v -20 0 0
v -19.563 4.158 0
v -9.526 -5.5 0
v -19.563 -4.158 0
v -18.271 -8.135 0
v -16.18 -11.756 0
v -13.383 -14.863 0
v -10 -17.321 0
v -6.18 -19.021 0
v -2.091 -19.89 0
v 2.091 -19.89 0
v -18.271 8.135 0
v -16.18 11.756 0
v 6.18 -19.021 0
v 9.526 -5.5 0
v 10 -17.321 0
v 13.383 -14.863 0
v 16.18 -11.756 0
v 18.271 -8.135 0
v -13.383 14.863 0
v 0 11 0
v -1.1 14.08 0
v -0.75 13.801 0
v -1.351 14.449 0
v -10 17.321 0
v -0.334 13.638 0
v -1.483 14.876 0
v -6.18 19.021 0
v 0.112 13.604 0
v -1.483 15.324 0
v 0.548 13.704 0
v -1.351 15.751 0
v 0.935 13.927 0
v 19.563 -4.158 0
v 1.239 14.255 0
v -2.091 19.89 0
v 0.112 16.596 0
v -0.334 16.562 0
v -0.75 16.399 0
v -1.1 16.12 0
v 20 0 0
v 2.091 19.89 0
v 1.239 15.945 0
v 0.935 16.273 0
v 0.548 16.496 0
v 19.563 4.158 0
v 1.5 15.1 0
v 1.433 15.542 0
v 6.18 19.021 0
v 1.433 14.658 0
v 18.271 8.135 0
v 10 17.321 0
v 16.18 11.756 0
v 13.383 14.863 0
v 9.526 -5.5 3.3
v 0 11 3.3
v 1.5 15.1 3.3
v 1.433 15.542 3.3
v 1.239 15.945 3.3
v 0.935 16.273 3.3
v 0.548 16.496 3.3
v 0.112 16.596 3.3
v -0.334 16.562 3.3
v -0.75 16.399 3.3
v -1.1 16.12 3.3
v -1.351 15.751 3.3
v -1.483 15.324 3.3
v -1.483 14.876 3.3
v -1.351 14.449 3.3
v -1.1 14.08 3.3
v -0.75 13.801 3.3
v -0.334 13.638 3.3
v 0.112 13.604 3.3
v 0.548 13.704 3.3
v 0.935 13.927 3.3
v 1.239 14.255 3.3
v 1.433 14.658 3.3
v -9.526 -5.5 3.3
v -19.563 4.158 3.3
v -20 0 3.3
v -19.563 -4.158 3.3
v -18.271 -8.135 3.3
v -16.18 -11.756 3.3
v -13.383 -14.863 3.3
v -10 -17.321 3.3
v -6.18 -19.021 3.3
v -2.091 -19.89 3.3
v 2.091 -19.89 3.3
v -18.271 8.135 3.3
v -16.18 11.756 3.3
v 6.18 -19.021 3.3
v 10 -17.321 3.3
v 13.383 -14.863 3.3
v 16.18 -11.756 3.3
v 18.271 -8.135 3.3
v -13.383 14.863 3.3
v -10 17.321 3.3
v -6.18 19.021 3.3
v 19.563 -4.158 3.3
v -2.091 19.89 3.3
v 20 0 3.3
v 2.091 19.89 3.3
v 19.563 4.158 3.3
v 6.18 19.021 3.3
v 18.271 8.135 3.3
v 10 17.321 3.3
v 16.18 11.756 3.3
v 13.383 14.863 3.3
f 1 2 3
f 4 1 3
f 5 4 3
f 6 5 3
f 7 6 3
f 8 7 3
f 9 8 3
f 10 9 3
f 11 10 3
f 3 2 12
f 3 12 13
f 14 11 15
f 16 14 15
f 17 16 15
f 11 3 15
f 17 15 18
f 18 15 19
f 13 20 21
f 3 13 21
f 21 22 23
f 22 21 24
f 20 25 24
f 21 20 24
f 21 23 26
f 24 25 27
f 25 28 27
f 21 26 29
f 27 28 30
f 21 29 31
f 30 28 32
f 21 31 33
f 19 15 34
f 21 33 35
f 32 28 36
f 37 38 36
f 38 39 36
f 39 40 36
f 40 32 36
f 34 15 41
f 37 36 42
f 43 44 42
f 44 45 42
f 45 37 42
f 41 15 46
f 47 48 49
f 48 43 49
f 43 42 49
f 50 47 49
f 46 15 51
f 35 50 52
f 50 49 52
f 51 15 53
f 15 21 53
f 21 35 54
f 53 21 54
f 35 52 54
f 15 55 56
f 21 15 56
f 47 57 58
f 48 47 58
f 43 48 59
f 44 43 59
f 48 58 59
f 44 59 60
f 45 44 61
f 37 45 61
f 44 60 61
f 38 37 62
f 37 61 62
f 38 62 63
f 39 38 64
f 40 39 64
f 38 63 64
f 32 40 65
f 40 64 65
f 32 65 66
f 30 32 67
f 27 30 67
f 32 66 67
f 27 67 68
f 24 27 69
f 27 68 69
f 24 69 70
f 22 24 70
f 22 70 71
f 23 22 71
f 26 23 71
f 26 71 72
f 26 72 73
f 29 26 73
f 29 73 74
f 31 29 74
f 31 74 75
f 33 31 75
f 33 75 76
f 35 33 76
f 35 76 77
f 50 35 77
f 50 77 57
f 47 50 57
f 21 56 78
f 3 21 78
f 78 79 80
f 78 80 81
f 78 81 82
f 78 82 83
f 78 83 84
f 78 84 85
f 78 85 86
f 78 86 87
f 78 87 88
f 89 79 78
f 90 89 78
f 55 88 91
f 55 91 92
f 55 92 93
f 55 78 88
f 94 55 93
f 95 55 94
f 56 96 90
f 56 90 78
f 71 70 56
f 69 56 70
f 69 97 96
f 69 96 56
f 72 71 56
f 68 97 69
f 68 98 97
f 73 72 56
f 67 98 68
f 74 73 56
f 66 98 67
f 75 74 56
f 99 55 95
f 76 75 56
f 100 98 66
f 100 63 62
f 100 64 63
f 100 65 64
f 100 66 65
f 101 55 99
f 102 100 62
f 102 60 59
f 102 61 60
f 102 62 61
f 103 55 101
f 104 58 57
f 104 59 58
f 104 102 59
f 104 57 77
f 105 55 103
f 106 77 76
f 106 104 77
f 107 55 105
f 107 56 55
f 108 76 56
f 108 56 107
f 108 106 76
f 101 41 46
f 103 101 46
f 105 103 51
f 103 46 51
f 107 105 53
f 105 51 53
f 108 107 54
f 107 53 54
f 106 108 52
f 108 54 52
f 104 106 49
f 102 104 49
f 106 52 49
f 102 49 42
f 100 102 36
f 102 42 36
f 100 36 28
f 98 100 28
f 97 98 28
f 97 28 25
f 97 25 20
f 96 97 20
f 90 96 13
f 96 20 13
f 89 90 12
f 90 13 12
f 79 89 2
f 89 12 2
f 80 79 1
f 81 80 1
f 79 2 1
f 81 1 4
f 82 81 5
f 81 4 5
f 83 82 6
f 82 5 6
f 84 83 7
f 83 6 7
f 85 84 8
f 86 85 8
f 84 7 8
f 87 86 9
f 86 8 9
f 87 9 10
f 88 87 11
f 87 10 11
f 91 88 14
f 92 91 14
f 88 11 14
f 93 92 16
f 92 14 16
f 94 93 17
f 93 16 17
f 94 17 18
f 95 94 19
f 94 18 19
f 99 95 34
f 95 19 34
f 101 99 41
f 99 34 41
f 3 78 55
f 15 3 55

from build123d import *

# Parameters (mm, degrees)
CYLINDER_R      = 20
CYLINDER_DEPTH  = 3.3
SKETCH_R        = 1.5
POCKET_DEPTH    = 3.301
POCKET001_DEPTH = 5


with BuildPart() as part:
    # Cylinder → Cylinder (new body)
    with BuildSketch(Plane.XY):
        Circle(CYLINDER_R)
    extrude(amount=CYLINDER_DEPTH)

    # Sketch → Pocket (cut, through all)
    with BuildSketch(Plane.XY.offset(3.3)):
        with Locations((0, 15.1)):
            Circle(SKETCH_R)
    extrude(amount=-POCKET_DEPTH, mode=Mode.SUBTRACT)

    # Sketch001 → Pocket001 (cut)
    with BuildSketch(Plane.XY.offset(3.3)):
        Polygon((0, 11), (-9.526279, -5.5), (9.526279, -5.5), align=None)
    extrude(amount=-POCKET001_DEPTH, mode=Mode.SUBTRACT)


solid = part.part
